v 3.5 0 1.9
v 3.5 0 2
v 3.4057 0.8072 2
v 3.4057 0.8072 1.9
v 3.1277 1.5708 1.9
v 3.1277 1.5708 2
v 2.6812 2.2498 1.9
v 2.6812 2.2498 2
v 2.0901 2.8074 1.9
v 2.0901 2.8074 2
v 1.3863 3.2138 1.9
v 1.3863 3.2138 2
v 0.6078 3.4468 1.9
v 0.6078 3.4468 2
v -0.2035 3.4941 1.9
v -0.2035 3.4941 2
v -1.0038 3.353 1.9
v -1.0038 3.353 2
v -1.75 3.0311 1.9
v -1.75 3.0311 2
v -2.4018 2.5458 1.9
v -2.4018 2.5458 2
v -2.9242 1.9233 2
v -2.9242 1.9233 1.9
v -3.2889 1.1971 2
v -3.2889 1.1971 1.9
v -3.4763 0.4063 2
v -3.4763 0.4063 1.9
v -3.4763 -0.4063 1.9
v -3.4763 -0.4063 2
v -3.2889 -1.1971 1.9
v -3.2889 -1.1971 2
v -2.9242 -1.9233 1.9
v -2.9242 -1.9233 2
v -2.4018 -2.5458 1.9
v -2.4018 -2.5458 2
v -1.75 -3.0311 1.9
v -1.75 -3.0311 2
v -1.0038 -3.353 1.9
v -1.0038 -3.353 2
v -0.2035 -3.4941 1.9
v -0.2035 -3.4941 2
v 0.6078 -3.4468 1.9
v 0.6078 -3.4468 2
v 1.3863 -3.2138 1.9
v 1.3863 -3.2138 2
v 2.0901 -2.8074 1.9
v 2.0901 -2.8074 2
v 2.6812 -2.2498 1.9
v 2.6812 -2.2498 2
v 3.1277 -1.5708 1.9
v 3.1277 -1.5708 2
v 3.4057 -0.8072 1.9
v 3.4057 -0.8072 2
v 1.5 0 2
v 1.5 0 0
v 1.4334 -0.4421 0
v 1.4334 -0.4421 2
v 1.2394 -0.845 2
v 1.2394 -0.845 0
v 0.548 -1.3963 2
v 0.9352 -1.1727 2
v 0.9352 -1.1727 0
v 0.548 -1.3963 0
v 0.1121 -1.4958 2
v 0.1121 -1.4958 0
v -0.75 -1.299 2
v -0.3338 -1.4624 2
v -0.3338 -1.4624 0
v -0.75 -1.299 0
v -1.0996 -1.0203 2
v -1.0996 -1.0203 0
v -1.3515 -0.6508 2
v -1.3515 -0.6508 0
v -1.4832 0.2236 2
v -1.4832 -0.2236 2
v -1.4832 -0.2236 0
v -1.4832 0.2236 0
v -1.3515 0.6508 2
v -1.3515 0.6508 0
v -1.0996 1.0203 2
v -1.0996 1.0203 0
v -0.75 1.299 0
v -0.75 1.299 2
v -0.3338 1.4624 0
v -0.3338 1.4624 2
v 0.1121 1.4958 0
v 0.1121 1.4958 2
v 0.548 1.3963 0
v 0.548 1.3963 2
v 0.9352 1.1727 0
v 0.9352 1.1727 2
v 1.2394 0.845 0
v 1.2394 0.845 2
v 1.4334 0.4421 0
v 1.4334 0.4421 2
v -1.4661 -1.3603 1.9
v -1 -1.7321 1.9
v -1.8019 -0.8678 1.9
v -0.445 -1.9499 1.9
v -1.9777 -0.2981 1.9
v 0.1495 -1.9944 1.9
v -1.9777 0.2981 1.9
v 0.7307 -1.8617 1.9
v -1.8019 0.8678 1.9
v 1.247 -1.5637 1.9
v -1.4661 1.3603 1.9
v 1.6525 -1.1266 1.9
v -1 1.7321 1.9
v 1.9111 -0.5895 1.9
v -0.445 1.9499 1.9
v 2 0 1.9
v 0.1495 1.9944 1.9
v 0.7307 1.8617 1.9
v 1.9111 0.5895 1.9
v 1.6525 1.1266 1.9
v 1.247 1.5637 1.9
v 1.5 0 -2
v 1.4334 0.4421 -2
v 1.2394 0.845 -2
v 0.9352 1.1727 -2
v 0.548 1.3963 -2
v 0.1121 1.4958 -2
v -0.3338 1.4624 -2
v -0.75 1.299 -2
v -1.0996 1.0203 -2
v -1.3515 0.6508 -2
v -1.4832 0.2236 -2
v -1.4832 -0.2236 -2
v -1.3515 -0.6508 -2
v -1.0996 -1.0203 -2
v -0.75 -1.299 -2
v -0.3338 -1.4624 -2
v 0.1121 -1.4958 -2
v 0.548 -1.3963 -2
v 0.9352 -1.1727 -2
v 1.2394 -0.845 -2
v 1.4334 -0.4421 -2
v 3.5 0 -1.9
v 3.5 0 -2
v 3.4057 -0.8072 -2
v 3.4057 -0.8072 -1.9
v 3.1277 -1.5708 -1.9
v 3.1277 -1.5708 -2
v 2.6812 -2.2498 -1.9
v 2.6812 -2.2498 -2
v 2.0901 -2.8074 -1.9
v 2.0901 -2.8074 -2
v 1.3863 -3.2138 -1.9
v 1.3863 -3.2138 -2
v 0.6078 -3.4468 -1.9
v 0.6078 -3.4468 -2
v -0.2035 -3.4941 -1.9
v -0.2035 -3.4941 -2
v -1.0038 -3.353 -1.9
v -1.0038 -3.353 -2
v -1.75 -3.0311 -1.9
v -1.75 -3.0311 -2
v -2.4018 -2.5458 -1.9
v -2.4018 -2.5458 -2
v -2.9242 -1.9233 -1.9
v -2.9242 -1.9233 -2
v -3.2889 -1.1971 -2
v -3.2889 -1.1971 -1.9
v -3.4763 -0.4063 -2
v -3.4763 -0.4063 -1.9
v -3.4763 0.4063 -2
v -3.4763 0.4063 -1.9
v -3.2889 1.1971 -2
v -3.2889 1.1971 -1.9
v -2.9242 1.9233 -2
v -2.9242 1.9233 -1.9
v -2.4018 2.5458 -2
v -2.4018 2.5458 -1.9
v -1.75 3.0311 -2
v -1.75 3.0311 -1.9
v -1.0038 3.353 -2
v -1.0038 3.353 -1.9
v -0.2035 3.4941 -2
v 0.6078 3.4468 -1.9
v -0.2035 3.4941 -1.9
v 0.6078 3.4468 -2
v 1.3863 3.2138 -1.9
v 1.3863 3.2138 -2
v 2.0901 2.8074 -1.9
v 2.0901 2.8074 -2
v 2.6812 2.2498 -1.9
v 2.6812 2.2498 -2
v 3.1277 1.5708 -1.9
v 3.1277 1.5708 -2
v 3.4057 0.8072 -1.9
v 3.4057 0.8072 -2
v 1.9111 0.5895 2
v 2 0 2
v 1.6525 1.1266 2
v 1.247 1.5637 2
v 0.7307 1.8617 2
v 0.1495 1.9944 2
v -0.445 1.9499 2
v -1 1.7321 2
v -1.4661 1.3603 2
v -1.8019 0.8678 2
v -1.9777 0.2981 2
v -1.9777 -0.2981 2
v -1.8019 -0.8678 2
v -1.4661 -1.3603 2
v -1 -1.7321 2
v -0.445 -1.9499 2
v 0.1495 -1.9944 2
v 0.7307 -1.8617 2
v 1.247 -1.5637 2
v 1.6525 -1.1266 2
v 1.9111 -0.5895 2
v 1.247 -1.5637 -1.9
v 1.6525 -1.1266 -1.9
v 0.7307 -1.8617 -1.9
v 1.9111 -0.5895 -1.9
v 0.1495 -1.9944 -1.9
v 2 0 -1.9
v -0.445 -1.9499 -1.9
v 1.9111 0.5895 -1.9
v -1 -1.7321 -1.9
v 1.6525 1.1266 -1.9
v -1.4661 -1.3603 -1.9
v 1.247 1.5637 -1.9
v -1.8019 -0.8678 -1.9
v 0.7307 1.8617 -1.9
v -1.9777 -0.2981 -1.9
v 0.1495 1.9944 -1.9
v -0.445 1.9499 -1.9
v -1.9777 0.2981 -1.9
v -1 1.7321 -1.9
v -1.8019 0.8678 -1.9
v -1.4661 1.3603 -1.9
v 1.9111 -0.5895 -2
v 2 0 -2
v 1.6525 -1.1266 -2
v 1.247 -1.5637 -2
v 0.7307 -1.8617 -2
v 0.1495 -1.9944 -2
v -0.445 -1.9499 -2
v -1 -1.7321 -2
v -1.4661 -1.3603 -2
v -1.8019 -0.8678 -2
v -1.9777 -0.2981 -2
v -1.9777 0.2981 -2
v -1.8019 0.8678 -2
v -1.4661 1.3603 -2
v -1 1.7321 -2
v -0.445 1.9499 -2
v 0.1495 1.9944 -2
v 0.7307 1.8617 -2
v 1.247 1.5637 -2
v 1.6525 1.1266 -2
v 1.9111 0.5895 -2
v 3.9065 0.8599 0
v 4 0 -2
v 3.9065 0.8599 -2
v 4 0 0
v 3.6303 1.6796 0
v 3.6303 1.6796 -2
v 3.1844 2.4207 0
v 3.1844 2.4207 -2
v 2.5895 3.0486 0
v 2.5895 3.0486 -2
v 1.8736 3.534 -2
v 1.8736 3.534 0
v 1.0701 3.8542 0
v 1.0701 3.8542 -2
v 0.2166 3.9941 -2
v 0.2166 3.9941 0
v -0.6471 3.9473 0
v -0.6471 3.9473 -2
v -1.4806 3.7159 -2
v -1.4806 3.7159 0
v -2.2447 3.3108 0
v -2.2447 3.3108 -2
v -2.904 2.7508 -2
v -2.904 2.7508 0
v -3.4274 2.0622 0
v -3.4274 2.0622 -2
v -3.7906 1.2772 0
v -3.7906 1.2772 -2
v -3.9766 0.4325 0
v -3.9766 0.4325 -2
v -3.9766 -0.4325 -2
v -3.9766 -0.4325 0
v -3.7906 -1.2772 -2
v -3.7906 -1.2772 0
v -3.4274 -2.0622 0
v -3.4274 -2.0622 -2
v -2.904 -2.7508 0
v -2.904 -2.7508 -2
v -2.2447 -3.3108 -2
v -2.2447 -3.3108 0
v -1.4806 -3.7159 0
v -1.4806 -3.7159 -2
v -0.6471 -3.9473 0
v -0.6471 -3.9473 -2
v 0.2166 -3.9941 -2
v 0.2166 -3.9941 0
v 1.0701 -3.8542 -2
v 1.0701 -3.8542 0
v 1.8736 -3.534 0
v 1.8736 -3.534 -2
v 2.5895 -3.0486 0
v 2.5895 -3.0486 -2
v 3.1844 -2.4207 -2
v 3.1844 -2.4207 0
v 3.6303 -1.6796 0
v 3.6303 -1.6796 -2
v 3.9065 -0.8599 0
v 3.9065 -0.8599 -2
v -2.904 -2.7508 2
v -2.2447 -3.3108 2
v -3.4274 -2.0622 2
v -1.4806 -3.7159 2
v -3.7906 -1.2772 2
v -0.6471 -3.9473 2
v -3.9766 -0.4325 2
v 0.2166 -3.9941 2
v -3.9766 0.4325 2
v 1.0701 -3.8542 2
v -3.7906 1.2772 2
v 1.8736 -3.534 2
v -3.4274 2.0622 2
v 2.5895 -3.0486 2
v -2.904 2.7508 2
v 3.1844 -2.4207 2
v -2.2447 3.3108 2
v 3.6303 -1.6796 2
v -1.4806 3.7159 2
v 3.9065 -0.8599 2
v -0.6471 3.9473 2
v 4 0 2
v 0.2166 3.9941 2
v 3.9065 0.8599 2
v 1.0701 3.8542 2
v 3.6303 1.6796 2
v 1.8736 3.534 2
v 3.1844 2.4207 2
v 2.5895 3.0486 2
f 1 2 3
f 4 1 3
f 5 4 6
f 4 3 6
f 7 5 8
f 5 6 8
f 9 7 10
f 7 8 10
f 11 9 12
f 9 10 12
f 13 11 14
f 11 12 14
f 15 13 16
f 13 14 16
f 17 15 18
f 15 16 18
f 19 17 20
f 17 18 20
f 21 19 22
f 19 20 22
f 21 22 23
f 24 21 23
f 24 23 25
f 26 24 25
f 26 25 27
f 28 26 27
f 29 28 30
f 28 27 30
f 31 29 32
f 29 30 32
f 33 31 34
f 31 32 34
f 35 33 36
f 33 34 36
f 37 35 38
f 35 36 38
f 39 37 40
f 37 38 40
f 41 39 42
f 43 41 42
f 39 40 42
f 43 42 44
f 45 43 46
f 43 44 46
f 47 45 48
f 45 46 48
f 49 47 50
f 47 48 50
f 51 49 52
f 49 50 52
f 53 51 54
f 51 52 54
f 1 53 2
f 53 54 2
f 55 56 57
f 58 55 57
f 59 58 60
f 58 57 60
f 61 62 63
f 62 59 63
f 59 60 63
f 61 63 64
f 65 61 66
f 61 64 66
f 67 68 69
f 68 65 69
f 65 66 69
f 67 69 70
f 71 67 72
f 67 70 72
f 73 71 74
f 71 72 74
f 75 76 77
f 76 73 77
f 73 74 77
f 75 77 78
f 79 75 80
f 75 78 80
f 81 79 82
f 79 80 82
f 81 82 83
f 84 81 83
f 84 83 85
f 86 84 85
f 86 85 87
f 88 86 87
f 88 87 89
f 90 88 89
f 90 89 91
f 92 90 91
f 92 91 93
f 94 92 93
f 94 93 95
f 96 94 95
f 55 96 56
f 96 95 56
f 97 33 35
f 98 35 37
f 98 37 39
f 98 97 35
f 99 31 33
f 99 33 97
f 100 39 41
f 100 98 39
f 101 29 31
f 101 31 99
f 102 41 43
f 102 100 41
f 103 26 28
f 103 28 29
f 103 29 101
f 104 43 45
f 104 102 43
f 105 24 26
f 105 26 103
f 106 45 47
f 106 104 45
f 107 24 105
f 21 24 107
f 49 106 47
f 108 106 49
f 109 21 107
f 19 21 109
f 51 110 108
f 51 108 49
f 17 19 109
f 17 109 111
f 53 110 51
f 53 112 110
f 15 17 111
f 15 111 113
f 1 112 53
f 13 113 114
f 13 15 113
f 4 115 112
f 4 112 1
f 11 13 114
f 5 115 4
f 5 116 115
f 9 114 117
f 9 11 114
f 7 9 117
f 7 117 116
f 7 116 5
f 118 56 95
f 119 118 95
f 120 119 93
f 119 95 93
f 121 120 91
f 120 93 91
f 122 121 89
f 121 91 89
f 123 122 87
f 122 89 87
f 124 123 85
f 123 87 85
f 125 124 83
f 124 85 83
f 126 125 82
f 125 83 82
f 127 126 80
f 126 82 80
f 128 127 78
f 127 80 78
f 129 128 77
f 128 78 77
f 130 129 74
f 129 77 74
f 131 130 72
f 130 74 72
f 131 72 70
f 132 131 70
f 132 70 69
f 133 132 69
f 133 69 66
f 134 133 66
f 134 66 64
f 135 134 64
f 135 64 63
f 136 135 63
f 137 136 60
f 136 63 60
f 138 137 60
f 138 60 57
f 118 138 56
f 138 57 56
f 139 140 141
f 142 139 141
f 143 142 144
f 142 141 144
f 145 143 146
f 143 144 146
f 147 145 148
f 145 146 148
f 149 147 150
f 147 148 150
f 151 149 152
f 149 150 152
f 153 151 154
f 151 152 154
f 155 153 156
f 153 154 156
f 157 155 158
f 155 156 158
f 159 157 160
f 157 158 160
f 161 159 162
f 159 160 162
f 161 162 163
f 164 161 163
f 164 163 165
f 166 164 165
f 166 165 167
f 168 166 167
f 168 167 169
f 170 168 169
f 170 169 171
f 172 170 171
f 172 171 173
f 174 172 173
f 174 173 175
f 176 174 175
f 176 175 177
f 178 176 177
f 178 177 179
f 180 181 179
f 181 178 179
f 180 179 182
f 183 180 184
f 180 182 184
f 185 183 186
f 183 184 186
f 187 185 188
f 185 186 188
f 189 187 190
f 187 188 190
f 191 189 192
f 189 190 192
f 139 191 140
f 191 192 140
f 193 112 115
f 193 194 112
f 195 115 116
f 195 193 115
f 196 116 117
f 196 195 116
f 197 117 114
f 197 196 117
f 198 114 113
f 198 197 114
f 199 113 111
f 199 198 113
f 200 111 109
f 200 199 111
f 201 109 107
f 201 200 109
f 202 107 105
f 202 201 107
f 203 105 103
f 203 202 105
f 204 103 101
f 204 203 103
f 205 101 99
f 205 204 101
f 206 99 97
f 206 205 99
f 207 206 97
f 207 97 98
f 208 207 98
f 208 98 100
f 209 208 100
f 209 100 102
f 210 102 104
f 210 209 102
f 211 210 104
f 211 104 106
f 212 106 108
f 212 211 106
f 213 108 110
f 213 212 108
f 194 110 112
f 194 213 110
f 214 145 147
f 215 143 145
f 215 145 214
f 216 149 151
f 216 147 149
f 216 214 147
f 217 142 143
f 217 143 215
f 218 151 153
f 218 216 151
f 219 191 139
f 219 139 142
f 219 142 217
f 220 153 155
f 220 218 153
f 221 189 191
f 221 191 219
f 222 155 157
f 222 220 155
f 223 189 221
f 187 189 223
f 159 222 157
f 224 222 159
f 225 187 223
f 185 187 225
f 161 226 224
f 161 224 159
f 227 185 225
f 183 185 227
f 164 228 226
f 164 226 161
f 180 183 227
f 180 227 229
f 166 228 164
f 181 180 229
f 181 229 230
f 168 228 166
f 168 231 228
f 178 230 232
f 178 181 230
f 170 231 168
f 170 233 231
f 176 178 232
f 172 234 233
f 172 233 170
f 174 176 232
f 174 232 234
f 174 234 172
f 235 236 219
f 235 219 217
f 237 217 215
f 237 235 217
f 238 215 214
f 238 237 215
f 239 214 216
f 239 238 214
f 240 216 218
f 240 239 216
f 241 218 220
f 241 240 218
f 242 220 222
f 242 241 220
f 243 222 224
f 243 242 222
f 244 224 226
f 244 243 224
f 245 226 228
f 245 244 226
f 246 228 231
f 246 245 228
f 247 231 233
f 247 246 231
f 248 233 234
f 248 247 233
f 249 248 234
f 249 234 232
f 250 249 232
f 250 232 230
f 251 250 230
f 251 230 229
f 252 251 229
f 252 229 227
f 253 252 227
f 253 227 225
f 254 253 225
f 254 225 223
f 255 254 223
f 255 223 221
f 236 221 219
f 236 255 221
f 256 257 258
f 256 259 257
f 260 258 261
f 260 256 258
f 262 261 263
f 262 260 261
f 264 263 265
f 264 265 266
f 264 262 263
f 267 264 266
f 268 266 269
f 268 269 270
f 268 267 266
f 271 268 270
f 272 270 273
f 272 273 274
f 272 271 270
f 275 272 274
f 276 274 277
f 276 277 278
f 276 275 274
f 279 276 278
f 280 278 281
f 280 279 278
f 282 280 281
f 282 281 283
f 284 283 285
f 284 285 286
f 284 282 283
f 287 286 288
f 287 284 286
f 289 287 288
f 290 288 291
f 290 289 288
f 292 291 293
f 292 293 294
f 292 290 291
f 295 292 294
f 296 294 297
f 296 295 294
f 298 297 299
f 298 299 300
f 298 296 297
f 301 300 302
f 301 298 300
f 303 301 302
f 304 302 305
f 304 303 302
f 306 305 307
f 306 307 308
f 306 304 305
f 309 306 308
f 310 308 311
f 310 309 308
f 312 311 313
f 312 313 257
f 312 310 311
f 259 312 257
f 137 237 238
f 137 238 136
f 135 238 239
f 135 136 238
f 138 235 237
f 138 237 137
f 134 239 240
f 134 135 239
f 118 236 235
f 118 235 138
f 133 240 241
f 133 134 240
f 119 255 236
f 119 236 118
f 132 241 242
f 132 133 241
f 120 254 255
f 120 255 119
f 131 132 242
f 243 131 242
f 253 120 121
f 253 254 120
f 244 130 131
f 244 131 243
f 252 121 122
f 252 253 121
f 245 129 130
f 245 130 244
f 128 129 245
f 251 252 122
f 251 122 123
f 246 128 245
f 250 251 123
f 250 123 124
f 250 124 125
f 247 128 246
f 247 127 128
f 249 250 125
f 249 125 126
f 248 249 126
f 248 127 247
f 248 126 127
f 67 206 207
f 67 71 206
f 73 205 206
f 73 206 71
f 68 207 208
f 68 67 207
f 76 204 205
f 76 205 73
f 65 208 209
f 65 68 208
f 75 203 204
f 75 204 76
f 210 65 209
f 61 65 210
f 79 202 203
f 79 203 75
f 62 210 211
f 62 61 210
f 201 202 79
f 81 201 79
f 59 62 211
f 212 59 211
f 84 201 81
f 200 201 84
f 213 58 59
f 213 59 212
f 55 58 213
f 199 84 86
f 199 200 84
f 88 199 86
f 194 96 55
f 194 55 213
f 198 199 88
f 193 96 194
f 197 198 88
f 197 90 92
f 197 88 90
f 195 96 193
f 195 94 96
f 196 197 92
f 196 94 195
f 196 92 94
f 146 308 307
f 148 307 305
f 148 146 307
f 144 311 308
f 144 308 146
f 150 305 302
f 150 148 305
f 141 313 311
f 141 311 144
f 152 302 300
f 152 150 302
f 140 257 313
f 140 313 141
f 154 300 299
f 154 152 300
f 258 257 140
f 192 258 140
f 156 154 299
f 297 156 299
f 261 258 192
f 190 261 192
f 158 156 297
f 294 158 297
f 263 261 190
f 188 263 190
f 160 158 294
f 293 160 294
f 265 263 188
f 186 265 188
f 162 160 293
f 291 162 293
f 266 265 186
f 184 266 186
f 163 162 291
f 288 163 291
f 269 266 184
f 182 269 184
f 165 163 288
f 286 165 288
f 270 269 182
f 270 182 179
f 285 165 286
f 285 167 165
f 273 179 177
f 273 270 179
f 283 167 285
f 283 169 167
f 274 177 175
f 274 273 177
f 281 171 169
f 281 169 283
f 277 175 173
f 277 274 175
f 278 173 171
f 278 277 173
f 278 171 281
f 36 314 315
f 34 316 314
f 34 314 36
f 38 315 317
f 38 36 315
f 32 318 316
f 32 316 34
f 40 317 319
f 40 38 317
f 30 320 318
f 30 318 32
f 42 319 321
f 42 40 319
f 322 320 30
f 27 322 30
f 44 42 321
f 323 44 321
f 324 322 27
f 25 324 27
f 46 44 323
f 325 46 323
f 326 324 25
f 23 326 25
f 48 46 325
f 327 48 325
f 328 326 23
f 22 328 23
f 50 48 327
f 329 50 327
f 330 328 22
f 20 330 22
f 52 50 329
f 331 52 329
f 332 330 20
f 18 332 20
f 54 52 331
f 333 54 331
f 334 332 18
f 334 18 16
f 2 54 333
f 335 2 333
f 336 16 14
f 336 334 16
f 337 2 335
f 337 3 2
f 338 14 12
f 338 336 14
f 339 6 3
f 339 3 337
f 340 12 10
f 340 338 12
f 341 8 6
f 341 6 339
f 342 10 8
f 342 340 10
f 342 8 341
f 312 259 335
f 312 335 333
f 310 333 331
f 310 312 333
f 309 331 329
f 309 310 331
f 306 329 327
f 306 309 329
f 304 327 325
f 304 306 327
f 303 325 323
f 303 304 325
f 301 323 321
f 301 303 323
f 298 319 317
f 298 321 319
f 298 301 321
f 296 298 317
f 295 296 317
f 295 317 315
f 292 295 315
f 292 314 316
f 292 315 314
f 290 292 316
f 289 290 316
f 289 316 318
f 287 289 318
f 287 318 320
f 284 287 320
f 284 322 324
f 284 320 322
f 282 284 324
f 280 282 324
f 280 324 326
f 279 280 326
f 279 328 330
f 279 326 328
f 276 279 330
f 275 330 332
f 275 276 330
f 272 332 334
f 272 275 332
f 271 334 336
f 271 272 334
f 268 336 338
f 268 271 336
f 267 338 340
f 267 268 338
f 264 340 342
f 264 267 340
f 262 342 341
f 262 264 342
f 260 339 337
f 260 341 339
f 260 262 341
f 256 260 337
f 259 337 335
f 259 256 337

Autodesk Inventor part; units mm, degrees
ref_plane "YZ Plane" through (0, 0, 0) normal (1, 0, 0) x (0, 1, 0)
ref_plane "XZ Plane" through (0, 0, 0) normal (0, 1, 0) x (-1, 0, 0)
ref_plane "XY Plane" through (0, 0, 0) normal (0, 0, 1) x (1, 0, 0)
sketch "スケッチ1" plane through (0, 0, 0) normal (0, 0, 1) x (1, 0, 0)
  circle A0 centre (0, 0) radius 1.5
  circle A1 centre (0, 0) radius 4
  circle A2 centre (0, 0) radius 2
  circle A3 centre (0, 0) radius 3.5
  dimension "d0" = 3
  dimension "d1" = 8
  dimension "d2" = 4
  dimension "d3" = 0.5
extrude "押し出し1" add sketch "スケッチ1" along normal blind 2 contours A1 | A2 | A3
extrude "押し出し2" cut sketch "スケッチ1" against normal blind 0.1 from surface at 2 contours A3
mirror "ミラー1" about plane through (0, 0, 0) normal (0, 0, -1) of "押し出し1", "押し出し2"
properties part number "693ZZ" material "ステンレス鋼"
